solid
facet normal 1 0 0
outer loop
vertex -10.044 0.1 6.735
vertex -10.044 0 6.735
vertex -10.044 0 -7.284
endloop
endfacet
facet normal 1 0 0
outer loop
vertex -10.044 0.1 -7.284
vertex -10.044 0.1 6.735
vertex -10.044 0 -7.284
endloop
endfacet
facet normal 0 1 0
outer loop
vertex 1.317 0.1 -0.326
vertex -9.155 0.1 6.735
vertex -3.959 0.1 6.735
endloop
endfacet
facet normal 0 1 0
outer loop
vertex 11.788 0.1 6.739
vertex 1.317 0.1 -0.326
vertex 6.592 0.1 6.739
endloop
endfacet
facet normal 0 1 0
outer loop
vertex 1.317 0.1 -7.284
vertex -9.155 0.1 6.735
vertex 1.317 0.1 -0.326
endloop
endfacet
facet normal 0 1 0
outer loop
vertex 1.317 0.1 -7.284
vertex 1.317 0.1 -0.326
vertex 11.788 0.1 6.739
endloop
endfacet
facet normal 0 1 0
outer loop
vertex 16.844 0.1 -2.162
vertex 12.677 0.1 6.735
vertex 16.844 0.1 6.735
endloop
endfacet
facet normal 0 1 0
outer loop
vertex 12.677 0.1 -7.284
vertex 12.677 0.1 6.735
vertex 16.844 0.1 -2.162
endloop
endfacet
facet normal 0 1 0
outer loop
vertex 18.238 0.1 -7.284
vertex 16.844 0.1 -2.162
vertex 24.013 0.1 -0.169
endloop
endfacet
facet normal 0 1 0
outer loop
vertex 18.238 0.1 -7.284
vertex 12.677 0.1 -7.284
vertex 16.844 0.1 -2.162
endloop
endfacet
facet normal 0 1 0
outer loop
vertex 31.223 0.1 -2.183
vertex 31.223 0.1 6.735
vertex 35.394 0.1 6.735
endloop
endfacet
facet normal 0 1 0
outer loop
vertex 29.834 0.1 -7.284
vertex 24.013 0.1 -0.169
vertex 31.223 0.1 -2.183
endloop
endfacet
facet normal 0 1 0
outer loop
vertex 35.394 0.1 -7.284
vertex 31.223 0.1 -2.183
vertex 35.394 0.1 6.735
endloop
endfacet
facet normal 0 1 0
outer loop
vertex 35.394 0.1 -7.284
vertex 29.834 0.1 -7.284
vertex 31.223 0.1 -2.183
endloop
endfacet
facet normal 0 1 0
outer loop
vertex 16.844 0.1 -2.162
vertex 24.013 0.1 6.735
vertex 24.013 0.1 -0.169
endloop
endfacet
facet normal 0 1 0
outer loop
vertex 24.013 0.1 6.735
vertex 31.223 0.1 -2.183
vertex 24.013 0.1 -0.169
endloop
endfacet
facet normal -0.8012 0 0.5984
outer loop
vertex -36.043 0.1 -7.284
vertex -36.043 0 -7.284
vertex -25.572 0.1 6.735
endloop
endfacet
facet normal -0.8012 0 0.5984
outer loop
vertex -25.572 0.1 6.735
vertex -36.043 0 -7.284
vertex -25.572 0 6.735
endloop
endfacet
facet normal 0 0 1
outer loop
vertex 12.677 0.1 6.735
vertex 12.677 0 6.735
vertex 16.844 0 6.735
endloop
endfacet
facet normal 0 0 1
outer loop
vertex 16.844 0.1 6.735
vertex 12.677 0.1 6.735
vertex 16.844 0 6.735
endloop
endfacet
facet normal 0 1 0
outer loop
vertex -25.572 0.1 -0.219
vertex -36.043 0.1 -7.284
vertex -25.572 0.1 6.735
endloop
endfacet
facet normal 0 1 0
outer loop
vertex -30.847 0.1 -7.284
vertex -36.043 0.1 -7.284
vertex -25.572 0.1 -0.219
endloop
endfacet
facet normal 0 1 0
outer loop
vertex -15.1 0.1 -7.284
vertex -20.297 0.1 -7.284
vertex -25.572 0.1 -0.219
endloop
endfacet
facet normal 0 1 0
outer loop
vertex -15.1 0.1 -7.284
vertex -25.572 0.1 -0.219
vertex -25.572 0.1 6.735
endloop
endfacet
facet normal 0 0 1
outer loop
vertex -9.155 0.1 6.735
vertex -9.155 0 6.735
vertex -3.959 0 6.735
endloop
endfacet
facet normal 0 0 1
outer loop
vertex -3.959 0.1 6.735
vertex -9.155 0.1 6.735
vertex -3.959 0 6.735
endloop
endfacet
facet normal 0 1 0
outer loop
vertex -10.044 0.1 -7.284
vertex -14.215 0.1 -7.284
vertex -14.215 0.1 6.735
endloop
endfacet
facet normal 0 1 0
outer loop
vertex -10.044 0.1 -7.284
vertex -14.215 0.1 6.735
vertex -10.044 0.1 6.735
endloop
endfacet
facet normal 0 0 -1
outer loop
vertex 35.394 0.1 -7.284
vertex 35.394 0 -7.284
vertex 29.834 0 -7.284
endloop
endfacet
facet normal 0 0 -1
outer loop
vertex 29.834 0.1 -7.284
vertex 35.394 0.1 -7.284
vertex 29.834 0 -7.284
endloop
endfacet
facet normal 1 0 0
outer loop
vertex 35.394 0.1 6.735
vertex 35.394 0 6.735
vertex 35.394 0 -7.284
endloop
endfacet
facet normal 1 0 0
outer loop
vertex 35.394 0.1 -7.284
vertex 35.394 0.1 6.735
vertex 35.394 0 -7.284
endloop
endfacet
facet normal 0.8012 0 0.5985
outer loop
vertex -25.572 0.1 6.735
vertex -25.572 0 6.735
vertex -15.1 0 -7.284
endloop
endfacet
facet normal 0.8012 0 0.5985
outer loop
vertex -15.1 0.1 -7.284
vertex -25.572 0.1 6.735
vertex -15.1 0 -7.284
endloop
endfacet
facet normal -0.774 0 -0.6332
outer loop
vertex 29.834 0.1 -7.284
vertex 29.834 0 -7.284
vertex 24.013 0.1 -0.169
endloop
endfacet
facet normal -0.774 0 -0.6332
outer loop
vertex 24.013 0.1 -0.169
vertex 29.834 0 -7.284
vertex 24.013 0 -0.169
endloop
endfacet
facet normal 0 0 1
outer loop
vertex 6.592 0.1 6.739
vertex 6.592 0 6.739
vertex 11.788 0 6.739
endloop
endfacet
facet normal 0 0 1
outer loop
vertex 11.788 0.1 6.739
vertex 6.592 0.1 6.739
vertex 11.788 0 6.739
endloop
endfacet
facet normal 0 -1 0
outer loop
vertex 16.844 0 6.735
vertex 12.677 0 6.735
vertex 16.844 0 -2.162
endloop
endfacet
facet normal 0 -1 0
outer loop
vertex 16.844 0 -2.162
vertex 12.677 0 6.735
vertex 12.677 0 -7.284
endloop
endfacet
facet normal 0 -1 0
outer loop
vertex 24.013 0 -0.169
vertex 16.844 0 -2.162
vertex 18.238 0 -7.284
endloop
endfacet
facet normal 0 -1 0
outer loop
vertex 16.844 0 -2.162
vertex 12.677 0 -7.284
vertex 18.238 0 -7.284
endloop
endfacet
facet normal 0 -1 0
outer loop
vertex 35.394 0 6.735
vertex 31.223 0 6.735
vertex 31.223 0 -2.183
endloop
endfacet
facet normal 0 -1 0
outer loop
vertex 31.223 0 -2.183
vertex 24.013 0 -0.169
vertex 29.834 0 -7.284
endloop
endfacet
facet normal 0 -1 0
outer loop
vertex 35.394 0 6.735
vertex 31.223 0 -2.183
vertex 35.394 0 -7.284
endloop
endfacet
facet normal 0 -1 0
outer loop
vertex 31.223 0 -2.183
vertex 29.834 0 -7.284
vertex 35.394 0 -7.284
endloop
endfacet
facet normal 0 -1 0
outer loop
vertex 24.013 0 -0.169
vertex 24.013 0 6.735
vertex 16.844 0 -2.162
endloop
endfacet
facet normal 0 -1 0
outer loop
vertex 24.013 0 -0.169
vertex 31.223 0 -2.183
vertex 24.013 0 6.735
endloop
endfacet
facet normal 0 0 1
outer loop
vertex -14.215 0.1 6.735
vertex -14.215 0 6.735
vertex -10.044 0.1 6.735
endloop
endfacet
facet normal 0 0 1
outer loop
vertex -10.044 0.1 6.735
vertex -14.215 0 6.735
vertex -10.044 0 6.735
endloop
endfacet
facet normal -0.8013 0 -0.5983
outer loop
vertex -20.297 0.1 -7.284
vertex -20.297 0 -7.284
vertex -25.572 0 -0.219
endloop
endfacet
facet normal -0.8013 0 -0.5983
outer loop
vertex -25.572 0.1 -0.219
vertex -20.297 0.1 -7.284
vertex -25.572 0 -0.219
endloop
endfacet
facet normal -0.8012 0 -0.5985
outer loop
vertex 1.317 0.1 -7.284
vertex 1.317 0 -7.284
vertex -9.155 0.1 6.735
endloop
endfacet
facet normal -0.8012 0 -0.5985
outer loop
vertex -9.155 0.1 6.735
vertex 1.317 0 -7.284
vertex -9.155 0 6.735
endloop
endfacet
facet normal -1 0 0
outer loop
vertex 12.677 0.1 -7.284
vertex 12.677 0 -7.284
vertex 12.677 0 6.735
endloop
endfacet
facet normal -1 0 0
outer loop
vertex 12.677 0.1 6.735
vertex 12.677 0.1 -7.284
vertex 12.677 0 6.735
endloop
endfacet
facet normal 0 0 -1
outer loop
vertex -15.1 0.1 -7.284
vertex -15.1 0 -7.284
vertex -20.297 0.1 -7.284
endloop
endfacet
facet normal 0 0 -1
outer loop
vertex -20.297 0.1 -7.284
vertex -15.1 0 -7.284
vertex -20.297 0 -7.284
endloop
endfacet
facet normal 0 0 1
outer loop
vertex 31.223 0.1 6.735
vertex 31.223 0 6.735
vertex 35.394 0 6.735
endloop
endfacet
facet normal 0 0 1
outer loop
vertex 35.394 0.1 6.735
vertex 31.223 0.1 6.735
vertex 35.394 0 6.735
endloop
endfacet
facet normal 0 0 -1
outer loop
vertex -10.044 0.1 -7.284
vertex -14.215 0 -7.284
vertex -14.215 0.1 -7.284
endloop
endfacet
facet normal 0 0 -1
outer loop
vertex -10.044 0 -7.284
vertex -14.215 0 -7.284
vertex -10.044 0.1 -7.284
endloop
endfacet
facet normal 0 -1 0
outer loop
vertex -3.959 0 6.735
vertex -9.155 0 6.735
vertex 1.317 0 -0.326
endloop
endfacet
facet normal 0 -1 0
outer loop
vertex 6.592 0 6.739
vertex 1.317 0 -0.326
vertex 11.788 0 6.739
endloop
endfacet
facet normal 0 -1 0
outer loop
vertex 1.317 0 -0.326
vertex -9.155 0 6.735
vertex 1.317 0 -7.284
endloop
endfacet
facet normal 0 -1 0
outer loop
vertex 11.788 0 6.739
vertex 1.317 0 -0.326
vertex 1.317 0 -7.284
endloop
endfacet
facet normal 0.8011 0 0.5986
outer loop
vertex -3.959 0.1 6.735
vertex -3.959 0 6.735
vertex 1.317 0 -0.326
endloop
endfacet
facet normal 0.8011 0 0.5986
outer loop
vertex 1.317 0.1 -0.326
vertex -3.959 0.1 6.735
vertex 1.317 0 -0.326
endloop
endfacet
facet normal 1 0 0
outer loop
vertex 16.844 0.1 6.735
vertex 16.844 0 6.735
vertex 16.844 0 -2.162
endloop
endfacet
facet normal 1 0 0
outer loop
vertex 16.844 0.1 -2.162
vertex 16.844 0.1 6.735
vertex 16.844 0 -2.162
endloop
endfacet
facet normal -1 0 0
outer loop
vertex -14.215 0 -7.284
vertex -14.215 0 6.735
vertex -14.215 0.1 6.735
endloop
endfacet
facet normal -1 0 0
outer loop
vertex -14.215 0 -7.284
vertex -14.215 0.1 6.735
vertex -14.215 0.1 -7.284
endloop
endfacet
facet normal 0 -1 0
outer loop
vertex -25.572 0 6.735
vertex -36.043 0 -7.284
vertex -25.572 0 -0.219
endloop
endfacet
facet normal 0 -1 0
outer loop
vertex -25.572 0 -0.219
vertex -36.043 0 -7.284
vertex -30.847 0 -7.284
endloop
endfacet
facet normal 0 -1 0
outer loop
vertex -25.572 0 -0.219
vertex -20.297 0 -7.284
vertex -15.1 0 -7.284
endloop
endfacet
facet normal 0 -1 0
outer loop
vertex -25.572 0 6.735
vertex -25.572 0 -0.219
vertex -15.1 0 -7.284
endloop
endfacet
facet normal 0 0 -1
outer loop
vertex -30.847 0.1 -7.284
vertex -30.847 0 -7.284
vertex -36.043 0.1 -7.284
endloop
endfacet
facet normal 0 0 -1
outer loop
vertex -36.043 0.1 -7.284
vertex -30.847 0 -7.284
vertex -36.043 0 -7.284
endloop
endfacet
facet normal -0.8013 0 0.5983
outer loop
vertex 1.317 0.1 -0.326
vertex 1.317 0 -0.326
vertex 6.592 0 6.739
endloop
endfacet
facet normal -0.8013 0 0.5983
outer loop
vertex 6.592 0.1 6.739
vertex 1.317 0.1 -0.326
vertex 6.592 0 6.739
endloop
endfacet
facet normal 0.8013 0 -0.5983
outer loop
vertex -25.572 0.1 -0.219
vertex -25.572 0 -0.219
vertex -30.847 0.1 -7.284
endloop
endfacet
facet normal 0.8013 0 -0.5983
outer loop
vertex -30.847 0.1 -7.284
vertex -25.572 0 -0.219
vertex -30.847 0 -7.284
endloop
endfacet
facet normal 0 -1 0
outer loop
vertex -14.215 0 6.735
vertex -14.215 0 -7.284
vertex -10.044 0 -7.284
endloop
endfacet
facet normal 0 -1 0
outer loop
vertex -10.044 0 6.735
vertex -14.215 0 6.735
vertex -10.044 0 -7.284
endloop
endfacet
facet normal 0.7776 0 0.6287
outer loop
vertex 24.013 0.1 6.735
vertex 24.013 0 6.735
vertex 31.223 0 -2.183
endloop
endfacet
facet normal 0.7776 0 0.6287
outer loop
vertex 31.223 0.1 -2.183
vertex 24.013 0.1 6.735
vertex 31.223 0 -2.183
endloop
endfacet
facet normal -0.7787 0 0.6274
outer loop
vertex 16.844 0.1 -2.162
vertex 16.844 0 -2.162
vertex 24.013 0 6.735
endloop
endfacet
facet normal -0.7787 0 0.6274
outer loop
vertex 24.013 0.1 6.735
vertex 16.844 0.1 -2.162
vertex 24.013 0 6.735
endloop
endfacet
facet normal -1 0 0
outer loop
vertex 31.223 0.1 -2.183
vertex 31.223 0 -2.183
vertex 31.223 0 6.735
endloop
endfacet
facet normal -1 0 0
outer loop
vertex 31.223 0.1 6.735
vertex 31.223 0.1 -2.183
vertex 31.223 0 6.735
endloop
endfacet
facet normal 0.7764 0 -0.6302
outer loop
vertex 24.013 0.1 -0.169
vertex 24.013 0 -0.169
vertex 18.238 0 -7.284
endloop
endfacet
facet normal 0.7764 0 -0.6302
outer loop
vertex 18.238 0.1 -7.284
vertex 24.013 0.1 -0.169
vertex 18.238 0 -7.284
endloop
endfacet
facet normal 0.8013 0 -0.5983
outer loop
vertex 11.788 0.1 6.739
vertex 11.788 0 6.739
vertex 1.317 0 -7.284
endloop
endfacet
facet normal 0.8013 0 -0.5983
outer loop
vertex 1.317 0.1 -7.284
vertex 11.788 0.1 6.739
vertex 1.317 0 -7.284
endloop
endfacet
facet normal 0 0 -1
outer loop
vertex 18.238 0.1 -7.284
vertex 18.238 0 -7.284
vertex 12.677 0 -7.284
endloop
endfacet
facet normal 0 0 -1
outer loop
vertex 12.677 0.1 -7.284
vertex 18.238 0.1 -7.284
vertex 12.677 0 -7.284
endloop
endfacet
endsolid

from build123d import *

# Parameters (mm, degrees)
SKETCH2_W             = 4.1713404
SKETCH2_H             = 14.01875022
BOSS_EXTRUDE3_DEPTH   = 0.1
BOSS_EXTRUDE3_2_DEPTH = 0.1
BOSS_EXTRUDE3_3_DEPTH = 0.1
BOSS_EXTRUDE3_4_DEPTH = 0.1


with BuildPart() as part:
    # Sketch2 → Boss-Extrude3 (new body)
    with BuildSketch(Plane(origin=(-16.778352461, 0, 2.915945943), x_dir=(1, 0, 0), z_dir=(0, 1, 0))):
        with Locations((4.648707026, 3.190600736)):
            Rectangle(SKETCH2_W, SKETCH2_H)
    extrude(amount=BOSS_EXTRUDE3_DEPTH)


with BuildPart() as body_2:
    # Sketch2 → Boss-Extrude3 2 (new body)
    with BuildSketch(Plane(origin=(-16.778352461, 0, 2.915945943), x_dir=(1, 0, 0), z_dir=(0, 1, 0))):
        Polygon((46.612047026, 10.199975846), (40.791205226, 3.085181846), (35.015931026, 10.199975846), (29.455540826, 10.199975846), (29.455540826, -3.818774374), (33.622690226, -3.818774374), (33.622690226, 5.077811846), (40.791205226, -3.818774374), (48.001096826, 5.098538246), (48.001096826, -3.818774374), (52.172437226, -3.818774374), (52.172437226, 10.199975846), align=None)
    extrude(amount=BOSS_EXTRUDE3_2_DEPTH)


with BuildPart() as body_3:
    # Sketch2 → Boss-Extrude3 3 (new body)
    with BuildSketch(Plane(origin=(-16.778352461, 0, 2.915945943), x_dir=(1, 0, 0), z_dir=(0, 1, 0))):
        Polygon((-3.518256574, 10.199975846), (-8.793353974, 3.134788046), (-14.068474234, 10.199975846), (-19.265062774, 10.199975846), (-8.793353974, -3.818774374), (1.678431026, 10.199975846), align=None)
    extrude(amount=BOSS_EXTRUDE3_3_DEPTH)


with BuildPart() as body_4:
    # Sketch2 → Boss-Extrude3 4 (new body)
    with BuildSketch(Plane(origin=(-16.778352461, 0, 2.915945943), x_dir=(1, 0, 0), z_dir=(0, 1, 0))):
        Polygon((18.094959026, 10.199975846), (7.623250226, -3.818774374), (12.819785426, -3.818774374), (18.094959026, 3.242306246), (23.370132626, -3.822904414), (28.566667826, -3.822904414), align=None)
    extrude(amount=BOSS_EXTRUDE3_4_DEPTH)


solid = Compound([part.part, body_2.part, body_3.part, body_4.part])
